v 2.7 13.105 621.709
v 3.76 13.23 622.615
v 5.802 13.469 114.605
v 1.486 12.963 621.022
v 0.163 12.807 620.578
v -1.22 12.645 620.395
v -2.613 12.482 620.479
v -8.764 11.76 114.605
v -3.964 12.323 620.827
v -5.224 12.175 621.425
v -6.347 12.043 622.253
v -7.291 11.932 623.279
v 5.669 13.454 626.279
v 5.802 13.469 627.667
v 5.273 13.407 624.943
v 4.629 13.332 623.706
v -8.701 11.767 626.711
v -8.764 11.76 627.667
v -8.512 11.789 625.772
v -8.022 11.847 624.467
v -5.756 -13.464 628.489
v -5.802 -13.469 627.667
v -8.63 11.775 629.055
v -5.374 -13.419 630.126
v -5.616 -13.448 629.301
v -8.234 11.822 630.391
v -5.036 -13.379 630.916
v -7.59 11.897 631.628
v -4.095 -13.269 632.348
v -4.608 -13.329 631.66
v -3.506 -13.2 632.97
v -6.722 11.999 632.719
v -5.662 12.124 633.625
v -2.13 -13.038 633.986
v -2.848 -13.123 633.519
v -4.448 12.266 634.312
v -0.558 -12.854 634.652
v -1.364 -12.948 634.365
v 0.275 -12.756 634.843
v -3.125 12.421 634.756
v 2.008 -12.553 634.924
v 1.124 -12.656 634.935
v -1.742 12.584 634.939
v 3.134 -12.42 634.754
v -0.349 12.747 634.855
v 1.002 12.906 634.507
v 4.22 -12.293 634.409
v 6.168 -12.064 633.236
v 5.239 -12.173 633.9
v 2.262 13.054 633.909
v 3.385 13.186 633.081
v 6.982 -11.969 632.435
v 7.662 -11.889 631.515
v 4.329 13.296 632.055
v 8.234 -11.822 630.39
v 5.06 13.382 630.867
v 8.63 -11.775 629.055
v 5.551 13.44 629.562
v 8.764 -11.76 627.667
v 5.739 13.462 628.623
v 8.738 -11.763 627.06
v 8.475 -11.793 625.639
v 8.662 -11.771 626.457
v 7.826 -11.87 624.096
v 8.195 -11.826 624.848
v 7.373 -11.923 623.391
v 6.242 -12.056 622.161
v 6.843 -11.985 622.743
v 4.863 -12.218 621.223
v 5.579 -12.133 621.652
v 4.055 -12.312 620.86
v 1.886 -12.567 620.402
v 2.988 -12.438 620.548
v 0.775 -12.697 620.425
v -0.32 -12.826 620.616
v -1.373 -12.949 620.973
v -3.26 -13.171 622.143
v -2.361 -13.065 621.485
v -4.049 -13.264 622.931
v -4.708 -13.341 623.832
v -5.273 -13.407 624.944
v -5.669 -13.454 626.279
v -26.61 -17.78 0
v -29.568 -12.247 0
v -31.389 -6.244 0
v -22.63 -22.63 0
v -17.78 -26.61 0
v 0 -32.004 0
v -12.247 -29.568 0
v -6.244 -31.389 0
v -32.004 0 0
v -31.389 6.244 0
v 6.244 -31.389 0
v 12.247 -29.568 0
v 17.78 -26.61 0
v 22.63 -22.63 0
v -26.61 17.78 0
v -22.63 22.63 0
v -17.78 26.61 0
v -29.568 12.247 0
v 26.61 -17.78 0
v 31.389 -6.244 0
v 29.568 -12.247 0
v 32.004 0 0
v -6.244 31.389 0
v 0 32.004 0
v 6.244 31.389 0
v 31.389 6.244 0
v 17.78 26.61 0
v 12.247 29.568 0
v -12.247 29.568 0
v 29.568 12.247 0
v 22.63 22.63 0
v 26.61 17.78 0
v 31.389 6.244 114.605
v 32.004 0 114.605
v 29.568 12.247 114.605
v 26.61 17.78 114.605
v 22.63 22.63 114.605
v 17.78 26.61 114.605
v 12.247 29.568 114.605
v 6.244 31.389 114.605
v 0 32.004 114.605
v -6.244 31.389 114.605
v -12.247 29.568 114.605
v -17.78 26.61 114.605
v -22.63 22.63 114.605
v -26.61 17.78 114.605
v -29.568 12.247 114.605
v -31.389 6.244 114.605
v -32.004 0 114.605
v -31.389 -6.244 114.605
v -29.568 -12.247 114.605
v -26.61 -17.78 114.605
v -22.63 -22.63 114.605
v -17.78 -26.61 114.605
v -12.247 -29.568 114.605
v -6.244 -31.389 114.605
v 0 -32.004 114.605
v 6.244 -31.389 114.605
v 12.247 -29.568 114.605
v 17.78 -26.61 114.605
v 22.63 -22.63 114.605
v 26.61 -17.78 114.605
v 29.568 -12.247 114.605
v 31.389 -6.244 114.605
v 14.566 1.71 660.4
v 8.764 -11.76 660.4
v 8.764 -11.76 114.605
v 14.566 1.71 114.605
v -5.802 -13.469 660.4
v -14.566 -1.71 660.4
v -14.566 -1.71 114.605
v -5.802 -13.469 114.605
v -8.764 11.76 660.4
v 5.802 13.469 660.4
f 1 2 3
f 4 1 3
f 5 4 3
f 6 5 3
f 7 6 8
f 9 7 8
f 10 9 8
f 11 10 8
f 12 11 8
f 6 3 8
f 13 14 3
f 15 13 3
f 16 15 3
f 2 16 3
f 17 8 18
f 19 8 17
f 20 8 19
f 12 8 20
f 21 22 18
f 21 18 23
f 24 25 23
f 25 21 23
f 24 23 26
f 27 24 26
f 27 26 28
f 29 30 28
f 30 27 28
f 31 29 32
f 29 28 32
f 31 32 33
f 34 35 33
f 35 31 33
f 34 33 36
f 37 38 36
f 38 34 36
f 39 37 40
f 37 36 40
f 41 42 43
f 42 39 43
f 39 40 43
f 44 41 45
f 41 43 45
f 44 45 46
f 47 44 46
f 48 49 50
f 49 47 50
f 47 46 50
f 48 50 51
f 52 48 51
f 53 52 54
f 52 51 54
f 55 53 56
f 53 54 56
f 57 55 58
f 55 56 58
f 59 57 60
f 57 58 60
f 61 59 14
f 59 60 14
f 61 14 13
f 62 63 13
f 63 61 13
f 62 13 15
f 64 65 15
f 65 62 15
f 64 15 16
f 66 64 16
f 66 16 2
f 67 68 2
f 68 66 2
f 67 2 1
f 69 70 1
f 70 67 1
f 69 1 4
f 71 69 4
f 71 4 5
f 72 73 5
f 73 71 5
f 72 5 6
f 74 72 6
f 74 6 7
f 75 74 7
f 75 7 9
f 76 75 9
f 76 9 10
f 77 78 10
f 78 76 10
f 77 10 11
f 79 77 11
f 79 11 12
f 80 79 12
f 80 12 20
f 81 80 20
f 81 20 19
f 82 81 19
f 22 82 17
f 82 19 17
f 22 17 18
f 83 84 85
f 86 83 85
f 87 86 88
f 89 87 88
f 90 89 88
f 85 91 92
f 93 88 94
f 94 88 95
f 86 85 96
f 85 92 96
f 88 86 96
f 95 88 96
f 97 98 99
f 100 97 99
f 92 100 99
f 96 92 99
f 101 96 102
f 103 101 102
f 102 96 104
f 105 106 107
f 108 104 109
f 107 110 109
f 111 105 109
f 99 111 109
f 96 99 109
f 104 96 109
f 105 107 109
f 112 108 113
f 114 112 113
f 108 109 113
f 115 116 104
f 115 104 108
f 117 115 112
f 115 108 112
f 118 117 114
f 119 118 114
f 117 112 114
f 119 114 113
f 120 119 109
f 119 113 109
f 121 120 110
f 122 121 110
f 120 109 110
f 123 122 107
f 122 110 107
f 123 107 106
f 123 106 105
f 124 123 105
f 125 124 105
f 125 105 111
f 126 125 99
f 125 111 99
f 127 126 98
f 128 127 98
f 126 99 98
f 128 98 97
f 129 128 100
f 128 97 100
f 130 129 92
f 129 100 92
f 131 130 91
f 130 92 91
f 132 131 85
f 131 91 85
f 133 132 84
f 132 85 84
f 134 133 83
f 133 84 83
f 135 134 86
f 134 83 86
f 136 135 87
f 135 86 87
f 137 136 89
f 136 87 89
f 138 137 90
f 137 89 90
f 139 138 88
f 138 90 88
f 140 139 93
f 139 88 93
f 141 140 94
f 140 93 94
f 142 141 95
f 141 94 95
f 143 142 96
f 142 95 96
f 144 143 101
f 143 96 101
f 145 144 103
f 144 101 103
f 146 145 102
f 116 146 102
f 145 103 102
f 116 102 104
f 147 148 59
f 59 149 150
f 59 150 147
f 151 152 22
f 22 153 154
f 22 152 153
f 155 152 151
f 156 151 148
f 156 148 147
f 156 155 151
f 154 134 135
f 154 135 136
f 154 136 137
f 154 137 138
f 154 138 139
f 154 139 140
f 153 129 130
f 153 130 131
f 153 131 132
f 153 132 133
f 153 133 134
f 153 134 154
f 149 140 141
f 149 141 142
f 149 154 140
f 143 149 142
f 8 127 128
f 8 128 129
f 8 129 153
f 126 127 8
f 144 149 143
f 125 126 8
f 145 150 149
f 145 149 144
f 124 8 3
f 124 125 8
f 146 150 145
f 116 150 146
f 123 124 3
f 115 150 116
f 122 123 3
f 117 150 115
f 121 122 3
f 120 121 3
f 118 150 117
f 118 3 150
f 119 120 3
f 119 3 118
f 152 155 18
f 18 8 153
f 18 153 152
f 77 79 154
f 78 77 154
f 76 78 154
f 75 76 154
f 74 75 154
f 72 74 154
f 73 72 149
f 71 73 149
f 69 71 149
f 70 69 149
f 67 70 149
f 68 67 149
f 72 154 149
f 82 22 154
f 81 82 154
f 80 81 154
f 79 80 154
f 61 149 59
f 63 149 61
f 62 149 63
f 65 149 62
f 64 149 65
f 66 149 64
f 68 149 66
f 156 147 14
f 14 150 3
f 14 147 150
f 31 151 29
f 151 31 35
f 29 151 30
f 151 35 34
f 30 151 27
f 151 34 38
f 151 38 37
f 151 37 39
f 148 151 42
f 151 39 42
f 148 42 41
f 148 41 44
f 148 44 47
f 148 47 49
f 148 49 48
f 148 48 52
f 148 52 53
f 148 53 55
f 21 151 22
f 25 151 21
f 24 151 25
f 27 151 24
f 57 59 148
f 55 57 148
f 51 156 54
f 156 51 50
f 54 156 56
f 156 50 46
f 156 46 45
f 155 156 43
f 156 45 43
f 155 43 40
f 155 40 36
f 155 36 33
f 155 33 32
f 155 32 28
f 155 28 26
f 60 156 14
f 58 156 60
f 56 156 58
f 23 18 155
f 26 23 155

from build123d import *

# Parameters (mm, degrees)
BOSS_EXTRUDE1_DEPTH = 660.4
SKETCH2_RX          = 7.33298
SKETCH2_RY          = 7.27642549
CUT_EXTRUDE1_DEPTH  = 33.02
SKETCH3_R           = 32.004
BOSS_EXTRUDE2_DEPTH = 114.6048


with BuildPart() as part:
    # Sketch1 → Boss-Extrude1 (new body)
    with BuildSketch(Plane.XY):
        Polygon((5.802204234, 13.469402687), (-8.763742784, 11.759557608), (-14.565947018, -1.709845079), (-5.802204234, -13.469402687), (8.763742784, -11.759557608), (14.565947018, 1.709845079), align=None)
    extrude(amount=BOSS_EXTRUDE1_DEPTH)

    # Sketch2 → Cut-Extrude1 (cut)
    with BuildSketch(Plane(origin=(-1.480769275, 12.614480148, 0), x_dir=(0.9931806044692795, 0.11658596358926146, 0), z_dir=(-0.11658596358926147, 0.9931806044692796, 0))):
        with Locations(Location((0, -627.66702), (0, 0, 180))):
            Ellipse(SKETCH2_RX, SKETCH2_RY)
    extrude(amount=-CUT_EXTRUDE1_DEPTH, mode=Mode.SUBTRACT)

    # Sketch3 → Boss-Extrude2 (add)
    with BuildSketch(Plane.XY):
        Circle(SKETCH3_R)
    extrude(amount=BOSS_EXTRUDE2_DEPTH)


solid = part.part
